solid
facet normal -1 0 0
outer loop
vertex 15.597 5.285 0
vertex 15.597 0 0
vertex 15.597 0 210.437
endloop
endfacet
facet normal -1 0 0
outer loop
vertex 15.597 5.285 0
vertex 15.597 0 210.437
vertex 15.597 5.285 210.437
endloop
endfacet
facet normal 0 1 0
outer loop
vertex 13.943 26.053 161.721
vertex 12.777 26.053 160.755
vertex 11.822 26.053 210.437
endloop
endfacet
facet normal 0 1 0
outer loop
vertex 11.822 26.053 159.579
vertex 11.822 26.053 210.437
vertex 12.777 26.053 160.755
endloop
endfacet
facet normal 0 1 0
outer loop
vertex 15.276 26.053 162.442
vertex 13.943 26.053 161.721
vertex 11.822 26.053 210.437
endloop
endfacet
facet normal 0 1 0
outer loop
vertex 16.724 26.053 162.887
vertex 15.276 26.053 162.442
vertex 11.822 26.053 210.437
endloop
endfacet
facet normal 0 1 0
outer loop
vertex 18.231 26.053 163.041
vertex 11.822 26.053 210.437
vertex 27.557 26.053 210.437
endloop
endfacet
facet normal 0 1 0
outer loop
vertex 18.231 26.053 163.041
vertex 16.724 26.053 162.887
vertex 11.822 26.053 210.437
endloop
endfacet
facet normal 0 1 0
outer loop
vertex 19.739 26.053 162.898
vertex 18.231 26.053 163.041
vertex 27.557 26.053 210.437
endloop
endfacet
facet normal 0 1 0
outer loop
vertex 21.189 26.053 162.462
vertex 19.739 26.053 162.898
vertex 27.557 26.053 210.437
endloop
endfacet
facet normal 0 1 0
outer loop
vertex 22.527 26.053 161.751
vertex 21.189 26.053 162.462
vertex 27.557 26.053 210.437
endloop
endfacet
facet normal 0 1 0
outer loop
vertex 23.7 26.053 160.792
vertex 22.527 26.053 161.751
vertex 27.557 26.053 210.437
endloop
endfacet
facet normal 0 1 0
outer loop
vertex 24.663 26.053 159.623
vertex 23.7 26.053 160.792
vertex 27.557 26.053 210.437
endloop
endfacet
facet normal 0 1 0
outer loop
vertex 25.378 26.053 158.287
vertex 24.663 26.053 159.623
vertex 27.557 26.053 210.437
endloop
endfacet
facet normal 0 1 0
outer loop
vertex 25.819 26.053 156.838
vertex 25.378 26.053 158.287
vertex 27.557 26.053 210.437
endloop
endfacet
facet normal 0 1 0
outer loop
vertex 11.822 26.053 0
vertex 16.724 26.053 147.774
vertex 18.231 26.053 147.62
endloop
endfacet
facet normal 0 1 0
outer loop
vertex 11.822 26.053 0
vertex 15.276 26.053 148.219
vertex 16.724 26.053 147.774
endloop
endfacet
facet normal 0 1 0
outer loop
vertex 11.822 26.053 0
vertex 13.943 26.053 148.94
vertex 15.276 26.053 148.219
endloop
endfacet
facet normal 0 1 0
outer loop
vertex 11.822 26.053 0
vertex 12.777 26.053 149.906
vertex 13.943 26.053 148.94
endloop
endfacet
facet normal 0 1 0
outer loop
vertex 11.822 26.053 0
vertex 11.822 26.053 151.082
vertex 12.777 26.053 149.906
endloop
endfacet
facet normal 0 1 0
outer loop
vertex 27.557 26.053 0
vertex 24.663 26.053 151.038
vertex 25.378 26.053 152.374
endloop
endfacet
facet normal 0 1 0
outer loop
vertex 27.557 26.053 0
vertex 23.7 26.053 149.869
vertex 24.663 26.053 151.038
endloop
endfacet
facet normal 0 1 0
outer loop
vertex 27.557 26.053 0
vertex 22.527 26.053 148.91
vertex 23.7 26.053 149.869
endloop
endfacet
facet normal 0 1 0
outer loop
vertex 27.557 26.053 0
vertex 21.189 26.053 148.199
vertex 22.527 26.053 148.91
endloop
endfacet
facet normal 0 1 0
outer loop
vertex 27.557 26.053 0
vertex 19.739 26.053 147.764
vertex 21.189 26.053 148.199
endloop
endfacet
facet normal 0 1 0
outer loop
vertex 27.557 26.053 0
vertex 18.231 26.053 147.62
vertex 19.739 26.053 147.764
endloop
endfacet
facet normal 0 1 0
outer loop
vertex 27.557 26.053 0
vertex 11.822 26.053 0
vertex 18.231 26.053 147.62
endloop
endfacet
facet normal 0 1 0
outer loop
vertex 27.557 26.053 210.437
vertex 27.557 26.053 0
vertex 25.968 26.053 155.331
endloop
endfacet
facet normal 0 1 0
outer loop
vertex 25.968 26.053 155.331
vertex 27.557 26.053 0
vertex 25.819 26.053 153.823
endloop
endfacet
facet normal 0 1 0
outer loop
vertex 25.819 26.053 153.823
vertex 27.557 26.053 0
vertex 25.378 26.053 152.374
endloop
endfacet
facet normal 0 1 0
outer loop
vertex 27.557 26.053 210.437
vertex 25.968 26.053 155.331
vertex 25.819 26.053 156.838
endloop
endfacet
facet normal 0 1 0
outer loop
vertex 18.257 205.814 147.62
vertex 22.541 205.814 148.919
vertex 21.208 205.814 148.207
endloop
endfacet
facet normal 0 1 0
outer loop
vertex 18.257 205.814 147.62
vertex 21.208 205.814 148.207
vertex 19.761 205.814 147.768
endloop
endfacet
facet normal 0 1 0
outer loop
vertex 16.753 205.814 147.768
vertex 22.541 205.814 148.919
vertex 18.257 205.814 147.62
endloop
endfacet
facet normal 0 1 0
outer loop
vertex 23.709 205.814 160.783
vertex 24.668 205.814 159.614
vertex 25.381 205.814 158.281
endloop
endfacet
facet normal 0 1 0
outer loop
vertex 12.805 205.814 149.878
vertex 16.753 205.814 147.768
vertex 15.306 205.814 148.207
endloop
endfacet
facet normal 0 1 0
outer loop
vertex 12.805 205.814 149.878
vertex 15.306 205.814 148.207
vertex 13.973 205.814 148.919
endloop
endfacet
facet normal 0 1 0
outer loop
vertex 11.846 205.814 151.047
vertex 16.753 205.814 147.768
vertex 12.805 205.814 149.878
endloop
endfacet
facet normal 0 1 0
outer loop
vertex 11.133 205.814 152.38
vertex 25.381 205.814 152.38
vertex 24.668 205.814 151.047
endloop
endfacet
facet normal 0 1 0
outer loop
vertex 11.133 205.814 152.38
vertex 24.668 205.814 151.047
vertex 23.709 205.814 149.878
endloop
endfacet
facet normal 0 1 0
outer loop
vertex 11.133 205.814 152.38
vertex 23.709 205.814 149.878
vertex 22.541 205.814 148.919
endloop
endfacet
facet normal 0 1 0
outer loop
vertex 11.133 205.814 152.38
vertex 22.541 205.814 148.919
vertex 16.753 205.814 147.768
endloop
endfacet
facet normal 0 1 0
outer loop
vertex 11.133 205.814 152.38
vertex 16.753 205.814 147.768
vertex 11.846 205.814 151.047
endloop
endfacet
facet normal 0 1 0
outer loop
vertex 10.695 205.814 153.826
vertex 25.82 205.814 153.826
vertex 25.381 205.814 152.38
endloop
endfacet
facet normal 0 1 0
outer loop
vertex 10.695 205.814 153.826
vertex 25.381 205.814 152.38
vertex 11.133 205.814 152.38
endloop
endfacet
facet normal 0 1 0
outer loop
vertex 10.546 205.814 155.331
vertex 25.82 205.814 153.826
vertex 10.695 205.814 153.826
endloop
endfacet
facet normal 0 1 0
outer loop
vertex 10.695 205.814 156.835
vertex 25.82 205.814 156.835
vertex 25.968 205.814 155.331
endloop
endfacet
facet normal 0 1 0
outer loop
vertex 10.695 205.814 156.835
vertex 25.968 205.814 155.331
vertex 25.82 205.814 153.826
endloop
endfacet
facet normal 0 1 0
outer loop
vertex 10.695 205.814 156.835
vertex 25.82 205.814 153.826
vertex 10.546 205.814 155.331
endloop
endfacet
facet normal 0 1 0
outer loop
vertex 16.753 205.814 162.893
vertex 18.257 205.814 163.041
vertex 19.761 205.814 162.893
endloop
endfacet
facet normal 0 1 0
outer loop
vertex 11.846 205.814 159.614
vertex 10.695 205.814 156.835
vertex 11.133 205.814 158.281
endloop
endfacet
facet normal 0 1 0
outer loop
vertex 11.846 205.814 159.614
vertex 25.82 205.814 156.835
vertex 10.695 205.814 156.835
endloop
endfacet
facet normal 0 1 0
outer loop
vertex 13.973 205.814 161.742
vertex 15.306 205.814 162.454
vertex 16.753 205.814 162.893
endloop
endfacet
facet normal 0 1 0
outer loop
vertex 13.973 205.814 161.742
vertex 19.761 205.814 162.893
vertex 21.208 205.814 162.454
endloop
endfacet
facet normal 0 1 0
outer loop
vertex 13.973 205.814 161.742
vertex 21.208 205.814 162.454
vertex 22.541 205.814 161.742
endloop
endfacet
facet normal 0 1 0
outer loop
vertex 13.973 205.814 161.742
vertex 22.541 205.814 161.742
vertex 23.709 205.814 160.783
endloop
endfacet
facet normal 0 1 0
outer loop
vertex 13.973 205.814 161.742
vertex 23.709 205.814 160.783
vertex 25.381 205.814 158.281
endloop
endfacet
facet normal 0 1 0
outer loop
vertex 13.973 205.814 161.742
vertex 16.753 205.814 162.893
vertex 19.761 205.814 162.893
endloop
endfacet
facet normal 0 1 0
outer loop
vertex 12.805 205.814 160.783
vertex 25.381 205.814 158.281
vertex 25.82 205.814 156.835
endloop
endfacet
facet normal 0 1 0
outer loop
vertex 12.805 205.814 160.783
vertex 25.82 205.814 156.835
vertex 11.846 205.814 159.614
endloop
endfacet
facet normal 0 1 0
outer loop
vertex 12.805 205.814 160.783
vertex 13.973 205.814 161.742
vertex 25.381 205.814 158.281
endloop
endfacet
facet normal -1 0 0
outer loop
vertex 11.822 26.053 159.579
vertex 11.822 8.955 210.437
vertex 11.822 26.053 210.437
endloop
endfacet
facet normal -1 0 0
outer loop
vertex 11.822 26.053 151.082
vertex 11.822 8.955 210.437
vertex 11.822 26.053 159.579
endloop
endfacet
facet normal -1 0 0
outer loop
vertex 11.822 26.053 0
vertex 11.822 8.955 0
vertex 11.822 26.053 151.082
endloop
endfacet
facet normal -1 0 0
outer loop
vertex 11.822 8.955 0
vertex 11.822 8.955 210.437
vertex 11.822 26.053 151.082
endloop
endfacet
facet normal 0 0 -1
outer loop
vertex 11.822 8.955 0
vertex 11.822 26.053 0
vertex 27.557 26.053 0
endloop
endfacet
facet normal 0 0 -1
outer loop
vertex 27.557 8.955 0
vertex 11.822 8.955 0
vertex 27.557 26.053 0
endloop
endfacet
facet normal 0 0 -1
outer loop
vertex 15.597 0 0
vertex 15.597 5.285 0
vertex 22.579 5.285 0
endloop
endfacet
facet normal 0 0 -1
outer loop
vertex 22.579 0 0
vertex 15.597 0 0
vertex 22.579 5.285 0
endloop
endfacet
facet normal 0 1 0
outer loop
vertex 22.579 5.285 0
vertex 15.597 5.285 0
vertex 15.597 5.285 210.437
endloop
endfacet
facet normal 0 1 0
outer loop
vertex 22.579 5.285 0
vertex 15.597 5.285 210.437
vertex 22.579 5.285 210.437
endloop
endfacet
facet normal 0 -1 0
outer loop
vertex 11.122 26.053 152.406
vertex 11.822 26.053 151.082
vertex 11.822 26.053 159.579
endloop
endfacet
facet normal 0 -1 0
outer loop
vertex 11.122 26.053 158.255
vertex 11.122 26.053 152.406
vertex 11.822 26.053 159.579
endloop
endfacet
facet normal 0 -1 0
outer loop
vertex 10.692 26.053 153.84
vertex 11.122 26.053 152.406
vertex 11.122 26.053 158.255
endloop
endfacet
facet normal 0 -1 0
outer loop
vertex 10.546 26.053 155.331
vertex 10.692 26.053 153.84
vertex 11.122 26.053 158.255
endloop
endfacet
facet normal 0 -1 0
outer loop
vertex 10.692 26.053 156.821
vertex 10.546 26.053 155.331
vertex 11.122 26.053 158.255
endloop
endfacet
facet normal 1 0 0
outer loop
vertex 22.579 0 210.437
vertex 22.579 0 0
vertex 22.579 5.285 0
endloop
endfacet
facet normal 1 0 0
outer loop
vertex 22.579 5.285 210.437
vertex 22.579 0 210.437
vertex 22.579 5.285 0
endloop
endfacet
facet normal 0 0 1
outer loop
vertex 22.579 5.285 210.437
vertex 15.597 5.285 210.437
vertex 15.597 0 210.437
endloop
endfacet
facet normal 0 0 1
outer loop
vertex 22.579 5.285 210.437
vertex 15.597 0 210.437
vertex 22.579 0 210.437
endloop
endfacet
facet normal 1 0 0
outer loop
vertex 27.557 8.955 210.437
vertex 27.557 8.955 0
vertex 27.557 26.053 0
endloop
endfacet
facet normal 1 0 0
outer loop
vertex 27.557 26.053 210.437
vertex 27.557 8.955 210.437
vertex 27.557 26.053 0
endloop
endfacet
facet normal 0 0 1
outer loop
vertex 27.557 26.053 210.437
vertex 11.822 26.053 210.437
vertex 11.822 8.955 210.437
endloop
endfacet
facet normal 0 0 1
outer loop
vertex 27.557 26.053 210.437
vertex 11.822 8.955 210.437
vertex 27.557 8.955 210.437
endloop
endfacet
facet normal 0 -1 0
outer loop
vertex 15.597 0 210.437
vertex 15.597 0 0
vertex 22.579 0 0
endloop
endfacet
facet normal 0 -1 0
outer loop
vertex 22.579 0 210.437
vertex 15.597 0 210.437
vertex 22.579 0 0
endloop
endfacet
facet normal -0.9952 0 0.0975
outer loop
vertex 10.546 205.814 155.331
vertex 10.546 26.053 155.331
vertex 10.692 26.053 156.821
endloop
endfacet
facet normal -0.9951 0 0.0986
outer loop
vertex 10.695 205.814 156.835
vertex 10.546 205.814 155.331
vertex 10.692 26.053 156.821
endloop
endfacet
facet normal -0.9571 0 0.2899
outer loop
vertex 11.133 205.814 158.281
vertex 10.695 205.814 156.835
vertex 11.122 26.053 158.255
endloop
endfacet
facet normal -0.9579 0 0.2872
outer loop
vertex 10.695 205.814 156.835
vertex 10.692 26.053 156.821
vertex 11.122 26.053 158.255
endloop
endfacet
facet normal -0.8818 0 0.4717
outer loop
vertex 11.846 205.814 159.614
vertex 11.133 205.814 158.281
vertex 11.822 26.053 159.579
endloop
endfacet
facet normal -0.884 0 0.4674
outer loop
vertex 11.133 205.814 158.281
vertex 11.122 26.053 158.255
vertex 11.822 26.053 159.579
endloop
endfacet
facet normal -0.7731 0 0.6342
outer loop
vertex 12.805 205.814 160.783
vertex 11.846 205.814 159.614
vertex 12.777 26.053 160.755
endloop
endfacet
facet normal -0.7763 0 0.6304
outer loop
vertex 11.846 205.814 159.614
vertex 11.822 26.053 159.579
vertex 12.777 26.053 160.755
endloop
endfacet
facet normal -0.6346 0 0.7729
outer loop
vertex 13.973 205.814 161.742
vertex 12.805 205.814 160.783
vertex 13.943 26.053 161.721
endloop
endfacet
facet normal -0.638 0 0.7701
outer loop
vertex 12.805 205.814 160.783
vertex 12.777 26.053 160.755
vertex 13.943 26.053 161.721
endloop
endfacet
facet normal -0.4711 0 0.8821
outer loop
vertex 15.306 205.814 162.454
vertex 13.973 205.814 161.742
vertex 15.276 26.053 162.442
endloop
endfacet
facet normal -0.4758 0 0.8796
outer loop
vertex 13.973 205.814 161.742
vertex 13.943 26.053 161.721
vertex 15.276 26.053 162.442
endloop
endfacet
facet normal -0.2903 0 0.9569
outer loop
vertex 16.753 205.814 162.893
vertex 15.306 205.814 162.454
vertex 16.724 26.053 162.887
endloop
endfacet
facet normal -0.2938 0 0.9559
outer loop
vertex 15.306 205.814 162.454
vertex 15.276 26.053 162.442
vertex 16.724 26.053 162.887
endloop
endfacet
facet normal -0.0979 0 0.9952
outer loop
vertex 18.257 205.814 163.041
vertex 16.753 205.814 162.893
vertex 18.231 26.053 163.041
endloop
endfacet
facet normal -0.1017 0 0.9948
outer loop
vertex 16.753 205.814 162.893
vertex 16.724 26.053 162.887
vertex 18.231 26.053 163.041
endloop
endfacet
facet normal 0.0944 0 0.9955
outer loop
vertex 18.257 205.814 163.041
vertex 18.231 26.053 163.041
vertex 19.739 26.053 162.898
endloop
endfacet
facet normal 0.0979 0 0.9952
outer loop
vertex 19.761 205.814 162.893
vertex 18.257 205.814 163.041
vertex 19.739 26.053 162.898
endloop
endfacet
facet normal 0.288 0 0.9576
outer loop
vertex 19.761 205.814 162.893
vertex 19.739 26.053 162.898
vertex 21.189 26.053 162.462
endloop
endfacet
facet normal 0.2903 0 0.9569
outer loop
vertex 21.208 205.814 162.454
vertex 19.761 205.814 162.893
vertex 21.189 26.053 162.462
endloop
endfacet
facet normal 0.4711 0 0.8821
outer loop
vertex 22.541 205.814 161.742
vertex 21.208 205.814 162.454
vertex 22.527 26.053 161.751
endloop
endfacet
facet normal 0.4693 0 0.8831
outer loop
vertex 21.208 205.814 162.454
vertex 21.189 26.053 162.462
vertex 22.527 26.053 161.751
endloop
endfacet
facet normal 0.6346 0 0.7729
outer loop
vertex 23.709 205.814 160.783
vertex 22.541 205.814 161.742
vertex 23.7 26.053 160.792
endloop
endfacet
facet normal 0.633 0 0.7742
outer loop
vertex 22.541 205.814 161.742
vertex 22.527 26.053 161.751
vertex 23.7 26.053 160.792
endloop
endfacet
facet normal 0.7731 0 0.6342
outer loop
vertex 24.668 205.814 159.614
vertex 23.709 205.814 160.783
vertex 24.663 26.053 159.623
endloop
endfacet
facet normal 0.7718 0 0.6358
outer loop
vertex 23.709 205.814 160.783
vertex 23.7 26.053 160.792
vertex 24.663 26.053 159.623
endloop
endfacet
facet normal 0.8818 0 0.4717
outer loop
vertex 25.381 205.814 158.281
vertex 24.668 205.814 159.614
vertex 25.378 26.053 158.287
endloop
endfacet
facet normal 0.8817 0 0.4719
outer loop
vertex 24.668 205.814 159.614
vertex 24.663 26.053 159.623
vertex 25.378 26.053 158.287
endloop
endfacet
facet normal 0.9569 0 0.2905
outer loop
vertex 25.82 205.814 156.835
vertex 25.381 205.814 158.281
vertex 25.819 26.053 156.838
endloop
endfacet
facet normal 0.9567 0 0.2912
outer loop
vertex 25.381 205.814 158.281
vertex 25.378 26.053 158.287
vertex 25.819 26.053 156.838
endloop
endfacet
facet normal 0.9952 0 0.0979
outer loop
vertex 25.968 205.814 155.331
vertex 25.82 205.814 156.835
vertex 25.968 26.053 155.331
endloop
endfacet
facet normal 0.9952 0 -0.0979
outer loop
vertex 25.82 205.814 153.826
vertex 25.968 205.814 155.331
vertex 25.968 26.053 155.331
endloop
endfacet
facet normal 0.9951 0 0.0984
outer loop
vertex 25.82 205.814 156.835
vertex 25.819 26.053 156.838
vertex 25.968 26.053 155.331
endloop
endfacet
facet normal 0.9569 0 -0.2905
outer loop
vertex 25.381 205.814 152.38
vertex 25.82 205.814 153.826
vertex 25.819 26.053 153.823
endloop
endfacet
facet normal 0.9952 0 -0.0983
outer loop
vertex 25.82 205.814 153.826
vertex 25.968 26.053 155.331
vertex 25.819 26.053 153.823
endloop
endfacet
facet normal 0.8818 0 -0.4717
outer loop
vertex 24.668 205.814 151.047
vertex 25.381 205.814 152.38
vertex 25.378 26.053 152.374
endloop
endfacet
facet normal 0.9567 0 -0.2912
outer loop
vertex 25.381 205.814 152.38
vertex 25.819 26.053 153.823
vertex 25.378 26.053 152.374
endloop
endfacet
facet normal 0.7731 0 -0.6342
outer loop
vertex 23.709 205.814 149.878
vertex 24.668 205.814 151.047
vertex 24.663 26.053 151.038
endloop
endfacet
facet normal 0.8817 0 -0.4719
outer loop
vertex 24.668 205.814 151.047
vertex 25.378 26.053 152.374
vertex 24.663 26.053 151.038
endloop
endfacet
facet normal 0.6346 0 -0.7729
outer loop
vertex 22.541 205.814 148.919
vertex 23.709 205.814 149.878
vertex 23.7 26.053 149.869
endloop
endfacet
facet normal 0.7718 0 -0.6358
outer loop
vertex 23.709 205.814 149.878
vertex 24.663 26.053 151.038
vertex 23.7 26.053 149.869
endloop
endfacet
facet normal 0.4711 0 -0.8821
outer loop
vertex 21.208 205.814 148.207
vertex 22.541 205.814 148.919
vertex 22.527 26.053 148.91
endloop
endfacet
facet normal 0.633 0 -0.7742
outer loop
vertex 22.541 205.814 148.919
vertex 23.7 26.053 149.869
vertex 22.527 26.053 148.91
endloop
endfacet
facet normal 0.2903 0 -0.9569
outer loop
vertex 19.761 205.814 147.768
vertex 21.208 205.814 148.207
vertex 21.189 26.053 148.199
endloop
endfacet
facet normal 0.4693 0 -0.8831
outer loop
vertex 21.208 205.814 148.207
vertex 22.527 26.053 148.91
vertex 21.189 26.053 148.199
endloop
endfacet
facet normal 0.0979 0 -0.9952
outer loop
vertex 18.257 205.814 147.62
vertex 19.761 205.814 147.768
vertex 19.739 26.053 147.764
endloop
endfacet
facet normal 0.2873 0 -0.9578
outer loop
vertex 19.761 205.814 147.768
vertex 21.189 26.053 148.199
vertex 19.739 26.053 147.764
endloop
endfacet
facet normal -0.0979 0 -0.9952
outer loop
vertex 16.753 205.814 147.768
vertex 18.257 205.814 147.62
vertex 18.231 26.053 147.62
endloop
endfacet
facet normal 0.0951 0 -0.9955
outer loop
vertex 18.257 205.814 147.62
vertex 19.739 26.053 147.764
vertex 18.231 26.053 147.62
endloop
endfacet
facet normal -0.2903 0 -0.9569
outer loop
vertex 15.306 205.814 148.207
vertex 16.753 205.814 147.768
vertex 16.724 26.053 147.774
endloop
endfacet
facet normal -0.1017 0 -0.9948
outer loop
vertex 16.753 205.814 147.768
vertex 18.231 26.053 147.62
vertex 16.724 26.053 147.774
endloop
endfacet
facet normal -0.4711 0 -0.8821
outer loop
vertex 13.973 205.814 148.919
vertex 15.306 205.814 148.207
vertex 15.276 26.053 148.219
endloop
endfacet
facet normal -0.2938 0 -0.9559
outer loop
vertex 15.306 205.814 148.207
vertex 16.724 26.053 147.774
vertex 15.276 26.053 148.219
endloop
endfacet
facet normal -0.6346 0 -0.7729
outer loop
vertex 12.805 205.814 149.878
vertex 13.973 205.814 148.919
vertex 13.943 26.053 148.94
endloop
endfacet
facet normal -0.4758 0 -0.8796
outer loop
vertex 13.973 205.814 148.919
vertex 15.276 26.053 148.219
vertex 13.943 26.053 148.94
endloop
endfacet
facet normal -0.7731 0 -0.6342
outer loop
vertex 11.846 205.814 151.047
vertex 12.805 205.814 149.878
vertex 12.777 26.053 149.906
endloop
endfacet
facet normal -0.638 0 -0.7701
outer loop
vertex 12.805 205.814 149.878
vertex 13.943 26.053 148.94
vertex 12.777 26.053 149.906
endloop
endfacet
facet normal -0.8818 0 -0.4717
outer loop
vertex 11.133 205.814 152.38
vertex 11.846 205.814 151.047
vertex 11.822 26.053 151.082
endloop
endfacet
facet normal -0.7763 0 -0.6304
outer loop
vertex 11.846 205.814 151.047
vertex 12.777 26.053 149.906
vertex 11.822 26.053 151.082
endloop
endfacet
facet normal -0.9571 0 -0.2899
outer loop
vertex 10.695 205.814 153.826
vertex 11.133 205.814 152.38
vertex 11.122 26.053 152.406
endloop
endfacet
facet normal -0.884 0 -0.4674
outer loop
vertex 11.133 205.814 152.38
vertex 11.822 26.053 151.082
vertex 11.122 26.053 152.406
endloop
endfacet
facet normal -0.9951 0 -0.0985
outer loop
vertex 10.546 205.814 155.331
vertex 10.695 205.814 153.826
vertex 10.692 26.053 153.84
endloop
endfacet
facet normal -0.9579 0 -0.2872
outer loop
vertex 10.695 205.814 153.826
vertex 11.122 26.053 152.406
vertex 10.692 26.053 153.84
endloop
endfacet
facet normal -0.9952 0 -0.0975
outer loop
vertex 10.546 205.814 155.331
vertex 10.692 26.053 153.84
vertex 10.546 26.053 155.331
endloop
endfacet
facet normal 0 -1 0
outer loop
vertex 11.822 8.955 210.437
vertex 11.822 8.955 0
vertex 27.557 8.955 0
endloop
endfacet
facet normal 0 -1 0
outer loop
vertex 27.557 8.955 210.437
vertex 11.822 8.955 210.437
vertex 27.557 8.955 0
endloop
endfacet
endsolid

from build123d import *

# Parameters (mm, degrees)
F0_W     = 15.734761
F0_H     = 17.0973
F0_W_2   = 6.981575
F0_H_2   = 5.285302
F1_DEPTH = 210.437238
F2_R     = 7.710674
F3_DEPTH = 179.760903


with BuildPart() as f1:
    # F0 (on Top) → F1 (new body)
    with BuildSketch(Plane.XY):
        with Locations((19.689442, 17.504056)):
            Rectangle(F0_W, F0_H)
        with Locations((19.088029, 2.642651)):
            Rectangle(F0_W_2, F0_H_2)
    extrude(amount=F1_DEPTH)

    # F2 (on face) → F3 (join)
    with BuildSketch(Plane(origin=(0, 26.052706, 0), x_dir=(-1, 0, 0), z_dir=(0, 1, 0))):
        with Locations((-18.257026, 155.330509)):
            Circle(F2_R)
    extrude(amount=F3_DEPTH)


solid = f1.part
